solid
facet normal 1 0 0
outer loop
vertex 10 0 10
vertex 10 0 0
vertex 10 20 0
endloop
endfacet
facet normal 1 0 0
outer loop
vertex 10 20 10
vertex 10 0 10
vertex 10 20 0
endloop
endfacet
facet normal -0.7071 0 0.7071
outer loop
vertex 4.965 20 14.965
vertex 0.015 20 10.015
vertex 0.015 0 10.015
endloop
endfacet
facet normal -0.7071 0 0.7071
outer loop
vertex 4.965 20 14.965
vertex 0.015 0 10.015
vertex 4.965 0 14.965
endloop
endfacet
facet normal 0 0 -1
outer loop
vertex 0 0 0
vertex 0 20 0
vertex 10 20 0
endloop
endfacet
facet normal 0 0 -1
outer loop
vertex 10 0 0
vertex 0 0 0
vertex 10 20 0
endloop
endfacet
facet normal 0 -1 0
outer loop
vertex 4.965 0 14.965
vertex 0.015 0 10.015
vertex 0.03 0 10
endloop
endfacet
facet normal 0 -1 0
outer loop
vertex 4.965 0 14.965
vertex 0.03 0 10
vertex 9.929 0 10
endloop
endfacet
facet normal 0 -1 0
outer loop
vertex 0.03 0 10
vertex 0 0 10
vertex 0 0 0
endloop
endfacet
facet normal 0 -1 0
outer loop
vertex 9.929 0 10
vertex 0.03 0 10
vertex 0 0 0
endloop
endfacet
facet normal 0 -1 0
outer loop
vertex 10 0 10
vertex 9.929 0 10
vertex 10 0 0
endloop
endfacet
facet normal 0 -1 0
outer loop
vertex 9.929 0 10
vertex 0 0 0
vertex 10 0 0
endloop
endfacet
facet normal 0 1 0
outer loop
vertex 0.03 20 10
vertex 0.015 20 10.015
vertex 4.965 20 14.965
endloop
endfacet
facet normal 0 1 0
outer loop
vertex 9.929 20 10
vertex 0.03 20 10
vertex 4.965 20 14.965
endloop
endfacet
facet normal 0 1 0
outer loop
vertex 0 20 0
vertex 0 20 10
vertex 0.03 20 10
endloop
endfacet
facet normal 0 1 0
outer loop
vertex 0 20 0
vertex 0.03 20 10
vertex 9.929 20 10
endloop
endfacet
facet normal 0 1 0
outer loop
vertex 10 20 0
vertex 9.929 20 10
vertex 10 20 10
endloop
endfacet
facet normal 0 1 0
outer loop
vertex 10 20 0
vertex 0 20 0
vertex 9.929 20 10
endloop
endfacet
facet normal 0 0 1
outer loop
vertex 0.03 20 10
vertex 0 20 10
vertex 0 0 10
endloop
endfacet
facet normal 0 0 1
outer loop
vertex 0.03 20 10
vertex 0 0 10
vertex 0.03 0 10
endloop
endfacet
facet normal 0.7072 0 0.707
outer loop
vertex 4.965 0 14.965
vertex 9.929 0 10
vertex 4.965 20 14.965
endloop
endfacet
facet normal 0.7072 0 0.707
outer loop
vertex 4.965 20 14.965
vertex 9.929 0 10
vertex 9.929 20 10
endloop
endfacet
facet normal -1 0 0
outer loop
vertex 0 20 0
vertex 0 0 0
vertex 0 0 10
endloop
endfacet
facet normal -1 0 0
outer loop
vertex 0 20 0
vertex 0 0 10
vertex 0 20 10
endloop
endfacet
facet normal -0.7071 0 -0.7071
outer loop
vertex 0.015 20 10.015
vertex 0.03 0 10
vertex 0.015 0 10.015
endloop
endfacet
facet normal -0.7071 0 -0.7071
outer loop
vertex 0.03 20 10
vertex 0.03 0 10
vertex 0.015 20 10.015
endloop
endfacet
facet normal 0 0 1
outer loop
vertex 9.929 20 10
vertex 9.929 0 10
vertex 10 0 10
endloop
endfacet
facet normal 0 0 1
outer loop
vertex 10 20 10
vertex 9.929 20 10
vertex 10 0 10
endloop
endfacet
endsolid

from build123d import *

# Parameters (mm, degrees)
BOX001_W               = 7
BOX001_H               = 20
BOX001_DEPTH           = 7.05
BOX001_PLACEMENT_ANGLE = 45
BOX_W                  = 10
BOX_H                  = 20
BOX_DEPTH              = 10


with BuildPart() as cub001:
    # Box001 → Box001 (new body)
    with BuildSketch(Plane.XY):
        with Locations((3.5, 10)):
            Rectangle(BOX001_W, BOX001_H)
    extrude(amount=BOX001_DEPTH)


with BuildPart() as cub001_1:
    # Box001 placement: moved
    add(cub001.part.moved(Location((5, 0, 5.03))).rotate(Axis((5, 0, 5.03), (0, -1, 0)), BOX001_PLACEMENT_ANGLE))


with BuildPart() as fusion:
    # Box → Box (new body)
    with BuildSketch(Plane.XY):
        with Locations((5, 10)):
            Rectangle(BOX_W, BOX_H)
    extrude(amount=BOX_DEPTH)

    # Fusion: union Cub001
    add(cub001_1.part)


solid = fusion.part
